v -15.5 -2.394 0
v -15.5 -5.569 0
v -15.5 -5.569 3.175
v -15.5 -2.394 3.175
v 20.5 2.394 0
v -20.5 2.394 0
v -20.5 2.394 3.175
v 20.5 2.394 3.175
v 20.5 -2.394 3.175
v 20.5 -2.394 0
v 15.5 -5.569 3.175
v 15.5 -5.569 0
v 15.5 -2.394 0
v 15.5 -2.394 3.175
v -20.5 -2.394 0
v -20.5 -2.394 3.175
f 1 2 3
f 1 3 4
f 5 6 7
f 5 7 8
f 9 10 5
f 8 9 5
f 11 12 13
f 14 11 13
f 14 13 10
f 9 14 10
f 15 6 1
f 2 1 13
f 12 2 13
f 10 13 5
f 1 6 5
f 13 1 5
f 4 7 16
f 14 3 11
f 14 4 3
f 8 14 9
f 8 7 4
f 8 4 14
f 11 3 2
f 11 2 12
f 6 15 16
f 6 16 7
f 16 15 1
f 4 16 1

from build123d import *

# Parameters (mm, degrees)
SKETCH1_W           = 41
SKETCH1_H           = 4.788
SKETCH1_W_2         = 12
SKETCH1_H_2         = 3.175
BOSS_EXTRUDE1_DEPTH = 3.175
SKETCH2_W           = 7
SKETCH2_H           = 3.175
BOSS_EXTRUDE3_DEPTH = 3.175


with BuildPart() as part:
    # Sketch1 → Boss-Extrude1 (new body)
    with BuildSketch(Plane.XY):
        Rectangle(SKETCH1_W, SKETCH1_H)
        with Locations((-9.5, -3.9815)):
            Rectangle(SKETCH1_W_2, SKETCH1_H_2)
        with Locations((9.5, -3.9815)):
            Rectangle(SKETCH1_W_2, SKETCH1_H_2)
    extrude(amount=BOSS_EXTRUDE1_DEPTH)

    # Sketch2 → Boss-Extrude3 (add)
    with BuildSketch(Plane.XY.offset(3.175)):
        with Locations((0, -3.9815)):
            Rectangle(SKETCH2_W, SKETCH2_H)
    extrude(amount=-BOSS_EXTRUDE3_DEPTH)


solid = part.part
